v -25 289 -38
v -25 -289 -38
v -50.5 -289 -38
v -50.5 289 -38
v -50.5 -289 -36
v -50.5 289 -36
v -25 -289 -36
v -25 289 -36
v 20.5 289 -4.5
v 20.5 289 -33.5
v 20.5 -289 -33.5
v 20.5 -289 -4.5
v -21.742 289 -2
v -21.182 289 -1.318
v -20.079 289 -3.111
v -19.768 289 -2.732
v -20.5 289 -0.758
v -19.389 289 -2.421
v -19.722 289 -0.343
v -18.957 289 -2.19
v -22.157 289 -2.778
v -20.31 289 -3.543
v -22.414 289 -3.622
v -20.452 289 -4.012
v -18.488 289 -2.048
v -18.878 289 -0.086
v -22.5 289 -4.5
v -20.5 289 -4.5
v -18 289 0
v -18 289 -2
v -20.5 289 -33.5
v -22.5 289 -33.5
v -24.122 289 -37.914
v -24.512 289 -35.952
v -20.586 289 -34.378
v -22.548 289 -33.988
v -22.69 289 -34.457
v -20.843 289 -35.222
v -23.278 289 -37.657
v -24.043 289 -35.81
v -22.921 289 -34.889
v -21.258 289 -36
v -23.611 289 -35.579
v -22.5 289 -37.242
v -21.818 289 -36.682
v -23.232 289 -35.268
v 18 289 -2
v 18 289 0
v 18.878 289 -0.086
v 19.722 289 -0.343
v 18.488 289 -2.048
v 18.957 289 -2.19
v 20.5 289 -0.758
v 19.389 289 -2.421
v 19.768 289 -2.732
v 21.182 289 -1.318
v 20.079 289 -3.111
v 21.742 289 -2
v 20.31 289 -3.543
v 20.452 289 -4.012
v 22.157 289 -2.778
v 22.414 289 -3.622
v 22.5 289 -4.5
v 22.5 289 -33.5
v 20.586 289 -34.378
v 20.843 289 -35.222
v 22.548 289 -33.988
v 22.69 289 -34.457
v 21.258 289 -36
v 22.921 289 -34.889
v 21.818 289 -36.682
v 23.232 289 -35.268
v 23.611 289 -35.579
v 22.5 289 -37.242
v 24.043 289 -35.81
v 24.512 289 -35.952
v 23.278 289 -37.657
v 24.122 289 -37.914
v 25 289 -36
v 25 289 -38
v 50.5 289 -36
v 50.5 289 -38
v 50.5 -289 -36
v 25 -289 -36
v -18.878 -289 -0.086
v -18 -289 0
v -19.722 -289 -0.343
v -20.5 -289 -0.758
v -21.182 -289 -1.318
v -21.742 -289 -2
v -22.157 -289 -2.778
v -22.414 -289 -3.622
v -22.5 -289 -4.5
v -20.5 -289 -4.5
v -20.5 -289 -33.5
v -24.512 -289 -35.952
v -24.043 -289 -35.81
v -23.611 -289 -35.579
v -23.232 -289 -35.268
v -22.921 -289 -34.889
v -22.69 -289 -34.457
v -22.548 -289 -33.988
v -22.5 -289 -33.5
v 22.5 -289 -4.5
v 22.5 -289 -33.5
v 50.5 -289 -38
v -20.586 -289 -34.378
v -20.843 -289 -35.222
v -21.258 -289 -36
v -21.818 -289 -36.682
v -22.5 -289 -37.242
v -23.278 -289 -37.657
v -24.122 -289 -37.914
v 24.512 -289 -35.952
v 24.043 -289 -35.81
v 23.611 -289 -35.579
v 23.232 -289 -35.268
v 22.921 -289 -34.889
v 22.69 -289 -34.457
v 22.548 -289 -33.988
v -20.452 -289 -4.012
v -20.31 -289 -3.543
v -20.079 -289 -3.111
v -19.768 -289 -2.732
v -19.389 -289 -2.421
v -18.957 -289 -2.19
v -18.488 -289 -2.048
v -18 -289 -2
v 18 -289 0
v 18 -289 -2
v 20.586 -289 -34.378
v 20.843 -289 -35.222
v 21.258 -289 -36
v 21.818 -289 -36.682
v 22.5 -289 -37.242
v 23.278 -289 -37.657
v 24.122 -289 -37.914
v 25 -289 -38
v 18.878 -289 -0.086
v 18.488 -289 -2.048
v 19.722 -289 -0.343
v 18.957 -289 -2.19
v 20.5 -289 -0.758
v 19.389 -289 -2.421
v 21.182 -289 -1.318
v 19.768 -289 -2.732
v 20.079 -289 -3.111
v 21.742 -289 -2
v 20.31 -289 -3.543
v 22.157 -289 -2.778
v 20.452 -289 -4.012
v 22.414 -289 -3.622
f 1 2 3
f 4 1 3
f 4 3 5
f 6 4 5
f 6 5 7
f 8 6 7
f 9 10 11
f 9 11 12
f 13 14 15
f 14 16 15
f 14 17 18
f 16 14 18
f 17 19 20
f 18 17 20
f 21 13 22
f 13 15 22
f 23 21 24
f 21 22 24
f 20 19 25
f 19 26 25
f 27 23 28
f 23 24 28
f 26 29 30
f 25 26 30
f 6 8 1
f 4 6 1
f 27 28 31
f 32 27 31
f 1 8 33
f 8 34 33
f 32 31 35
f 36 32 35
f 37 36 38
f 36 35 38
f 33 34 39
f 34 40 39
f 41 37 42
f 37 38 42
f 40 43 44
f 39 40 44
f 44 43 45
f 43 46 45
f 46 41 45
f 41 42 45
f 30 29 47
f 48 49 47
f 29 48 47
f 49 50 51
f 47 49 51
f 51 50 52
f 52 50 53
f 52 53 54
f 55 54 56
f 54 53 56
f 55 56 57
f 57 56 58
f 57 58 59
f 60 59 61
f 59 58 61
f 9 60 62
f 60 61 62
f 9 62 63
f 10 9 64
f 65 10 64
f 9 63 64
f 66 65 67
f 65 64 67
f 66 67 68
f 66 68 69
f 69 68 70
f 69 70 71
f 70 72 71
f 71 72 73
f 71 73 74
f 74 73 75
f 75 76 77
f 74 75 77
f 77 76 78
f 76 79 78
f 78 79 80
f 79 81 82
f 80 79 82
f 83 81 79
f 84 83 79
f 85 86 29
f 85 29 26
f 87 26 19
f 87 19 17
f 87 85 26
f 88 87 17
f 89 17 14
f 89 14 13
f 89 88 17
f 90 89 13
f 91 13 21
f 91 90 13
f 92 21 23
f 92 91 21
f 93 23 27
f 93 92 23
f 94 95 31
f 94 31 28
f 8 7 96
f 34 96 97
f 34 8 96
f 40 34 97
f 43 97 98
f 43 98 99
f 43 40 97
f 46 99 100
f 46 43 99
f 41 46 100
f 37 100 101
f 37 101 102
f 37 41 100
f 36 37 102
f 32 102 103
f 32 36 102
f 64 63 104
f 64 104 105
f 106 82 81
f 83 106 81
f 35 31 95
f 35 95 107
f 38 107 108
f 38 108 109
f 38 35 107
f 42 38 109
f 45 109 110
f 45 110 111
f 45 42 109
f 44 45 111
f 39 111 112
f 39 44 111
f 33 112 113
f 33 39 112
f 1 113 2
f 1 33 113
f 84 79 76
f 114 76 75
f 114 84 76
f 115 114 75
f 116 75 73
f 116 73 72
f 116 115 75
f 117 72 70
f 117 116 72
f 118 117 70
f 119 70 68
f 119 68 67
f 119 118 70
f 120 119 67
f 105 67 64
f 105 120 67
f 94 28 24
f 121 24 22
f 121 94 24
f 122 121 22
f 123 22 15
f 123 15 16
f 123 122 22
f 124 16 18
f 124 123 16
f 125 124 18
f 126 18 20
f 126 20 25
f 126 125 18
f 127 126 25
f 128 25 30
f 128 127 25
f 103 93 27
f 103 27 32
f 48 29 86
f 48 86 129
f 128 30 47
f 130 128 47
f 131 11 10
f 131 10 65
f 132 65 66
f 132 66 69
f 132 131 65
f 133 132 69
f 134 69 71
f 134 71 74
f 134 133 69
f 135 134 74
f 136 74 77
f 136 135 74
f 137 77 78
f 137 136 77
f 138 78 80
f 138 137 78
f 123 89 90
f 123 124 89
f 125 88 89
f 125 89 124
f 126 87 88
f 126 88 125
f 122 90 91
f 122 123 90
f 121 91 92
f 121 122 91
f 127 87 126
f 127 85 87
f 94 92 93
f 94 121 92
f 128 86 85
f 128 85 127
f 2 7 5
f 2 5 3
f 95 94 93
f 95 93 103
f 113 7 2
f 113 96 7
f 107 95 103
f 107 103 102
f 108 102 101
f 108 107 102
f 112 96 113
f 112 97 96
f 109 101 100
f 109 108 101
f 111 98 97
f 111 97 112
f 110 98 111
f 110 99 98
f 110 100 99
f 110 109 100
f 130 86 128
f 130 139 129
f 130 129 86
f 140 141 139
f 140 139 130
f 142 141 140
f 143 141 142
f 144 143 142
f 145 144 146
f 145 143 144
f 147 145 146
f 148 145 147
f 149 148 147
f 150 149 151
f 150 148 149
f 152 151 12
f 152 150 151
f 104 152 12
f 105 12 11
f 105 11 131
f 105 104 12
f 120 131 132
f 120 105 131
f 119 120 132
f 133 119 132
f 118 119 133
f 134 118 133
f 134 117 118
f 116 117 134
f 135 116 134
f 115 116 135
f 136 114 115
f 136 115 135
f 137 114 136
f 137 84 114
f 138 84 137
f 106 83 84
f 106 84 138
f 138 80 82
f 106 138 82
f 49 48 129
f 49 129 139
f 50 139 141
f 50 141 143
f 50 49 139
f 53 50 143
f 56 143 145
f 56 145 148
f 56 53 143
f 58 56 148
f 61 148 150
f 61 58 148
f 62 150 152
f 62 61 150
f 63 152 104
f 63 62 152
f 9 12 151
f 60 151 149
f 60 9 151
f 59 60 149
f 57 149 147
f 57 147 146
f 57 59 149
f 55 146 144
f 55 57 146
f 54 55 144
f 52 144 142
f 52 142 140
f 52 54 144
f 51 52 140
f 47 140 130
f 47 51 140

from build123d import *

# Parameters (mm, degrees)
SKETCH1_W                      = 45
SKETCH1_H                      = 578
BASE_FLANGE1_DEPTH             = 2
EDGE_FLANGE1_STRIP_W           = 13
EDGE_FLANGE1_STRIP_H           = 2
EDGE_FLANGE1_STRIP_CUT_DEPTH   = 578
EDGE_FLANGE1_STRIP_2_W         = 13
EDGE_FLANGE1_STRIP_2_H         = 2
EDGE_FLANGE1_STRIP_CUT_2_DEPTH = 578
EDGE_FLANGE1_DEPTH             = 578
EDGE_FLANGE1_BEND_DEPTH        = 578
EDGE_FLANGE2_STRIP_W           = 13
EDGE_FLANGE2_STRIP_H           = 2
EDGE_FLANGE2_STRIP_CUT_DEPTH   = 578
EDGE_FLANGE2_STRIP_2_W         = 13
EDGE_FLANGE2_STRIP_2_H         = 2
EDGE_FLANGE2_STRIP_CUT_2_DEPTH = 578
EDGE_FLANGE2_DEPTH             = 578
EDGE_FLANGE2_BEND_DEPTH        = 578


# Sheet-metal steps are written as plain solids
with BuildPart() as part:
    # Sketch1 → Base-Flange1 (new body)
    with BuildSketch(Plane.XY):
        Rectangle(SKETCH1_W, SKETCH1_H)
    extrude(amount=-BASE_FLANGE1_DEPTH)

    # Edge-Flange1 strip (across the edge) → Edge-Flange1 strip cut (cut)
    with BuildSketch(Plane(origin=(22.5, 289, -2), x_dir=(-1, 0, 0), z_dir=(0, -1, 0))):
        with Locations((-2, -1)):
            Rectangle(EDGE_FLANGE1_STRIP_W, EDGE_FLANGE1_STRIP_H)
    extrude(amount=EDGE_FLANGE1_STRIP_CUT_DEPTH, mode=Mode.SUBTRACT)

    # Edge-Flange1 strip 2 (across the edge) → Edge-Flange1 strip cut 2 (cut)
    with BuildSketch(Plane(origin=(-22.5, -289, -2), x_dir=(1, 0, 0), z_dir=(0, 1, 0))):
        with Locations((-2, -1)):
            Rectangle(EDGE_FLANGE1_STRIP_2_W, EDGE_FLANGE1_STRIP_2_H)
    extrude(amount=EDGE_FLANGE1_STRIP_CUT_2_DEPTH, mode=Mode.SUBTRACT)

    # Edge-Flange1 section (across the edge) → Edge-Flange1 (add)
    with BuildSketch(Plane(origin=(22.5, 289, -2), x_dir=(-1, 0, 0), z_dir=(0, -1, 0))):
        with BuildLine():
            Line((0, 2.5), (0, 36))
            Line((0, 36), (2, 36))
            Line((2, 36), (2, 2.5))
            ThreePointArc((2, 2.5), (2.732233047, 0.732233047), (4.5, 0))
            Line((4.5, 0), (4.5, -2))
            ThreePointArc((4.5, -2), (1.318019485, -0.681980515), (0, 2.5))
        make_face()
    extrude(amount=EDGE_FLANGE1_DEPTH)

    # Edge-Flange1 section 2 (across the edge) → Edge-Flange1 bend (add)
    with BuildSketch(Plane(origin=(-22.5, -289, -2), x_dir=(1, 0, 0), z_dir=(0, 1, 0))):
        with BuildLine():
            Line((0, 2.5), (0, 36))
            Line((0, 36), (2, 36))
            Line((2, 36), (2, 2.5))
            ThreePointArc((2, 2.5), (2.732233047, 0.732233047), (4.5, 0))
            Line((4.5, 0), (4.5, -2))
            ThreePointArc((4.5, -2), (1.318019485, -0.681980515), (0, 2.5))
        make_face()
    extrude(amount=EDGE_FLANGE1_BEND_DEPTH)

    # Edge-Flange2 strip (across the edge) → Edge-Flange2 strip cut (cut)
    with BuildSketch(Plane(origin=(-22.5, 289, -38), x_dir=(0, 0, 1), z_dir=(0, -1, 0))):
        with Locations((-2, -1)):
            Rectangle(EDGE_FLANGE2_STRIP_W, EDGE_FLANGE2_STRIP_H)
    extrude(amount=EDGE_FLANGE2_STRIP_CUT_DEPTH, mode=Mode.SUBTRACT)

    # Edge-Flange2 strip 2 (across the edge) → Edge-Flange2 strip cut 2 (cut)
    with BuildSketch(Plane(origin=(22.5, -289, -38), x_dir=(0, 0, 1), z_dir=(0, 1, 0))):
        with Locations((-2, -1)):
            Rectangle(EDGE_FLANGE2_STRIP_2_W, EDGE_FLANGE2_STRIP_2_H)
    extrude(amount=EDGE_FLANGE2_STRIP_CUT_2_DEPTH, mode=Mode.SUBTRACT)

    # Edge-Flange2 section (across the edge) → Edge-Flange2 (add)
    with BuildSketch(Plane(origin=(-22.5, 289, -38), x_dir=(0, 0, 1), z_dir=(0, -1, 0))):
        with BuildLine():
            Line((0, 2.5), (0, 28))
            Line((0, 28), (2, 28))
            Line((2, 28), (2, 2.5))
            ThreePointArc((2, 2.5), (2.732233047, 0.732233047), (4.5, 0))
            Line((4.5, 0), (4.5, -2))
            ThreePointArc((4.5, -2), (1.318019485, -0.681980515), (0, 2.5))
        make_face()
    extrude(amount=EDGE_FLANGE2_DEPTH)

    # Edge-Flange2 section 2 (across the edge) → Edge-Flange2 bend (add)
    with BuildSketch(Plane(origin=(22.5, -289, -38), x_dir=(0, 0, 1), z_dir=(0, 1, 0))):
        with BuildLine():
            Line((0, 2.5), (0, 28))
            Line((0, 28), (2, 28))
            Line((2, 28), (2, 2.5))
            ThreePointArc((2, 2.5), (2.732233047, 0.732233047), (4.5, 0))
            Line((4.5, 0), (4.5, -2))
            ThreePointArc((4.5, -2), (1.318019485, -0.681980515), (0, 2.5))
        make_face()
    extrude(amount=EDGE_FLANGE2_BEND_DEPTH)


solid = part.part
